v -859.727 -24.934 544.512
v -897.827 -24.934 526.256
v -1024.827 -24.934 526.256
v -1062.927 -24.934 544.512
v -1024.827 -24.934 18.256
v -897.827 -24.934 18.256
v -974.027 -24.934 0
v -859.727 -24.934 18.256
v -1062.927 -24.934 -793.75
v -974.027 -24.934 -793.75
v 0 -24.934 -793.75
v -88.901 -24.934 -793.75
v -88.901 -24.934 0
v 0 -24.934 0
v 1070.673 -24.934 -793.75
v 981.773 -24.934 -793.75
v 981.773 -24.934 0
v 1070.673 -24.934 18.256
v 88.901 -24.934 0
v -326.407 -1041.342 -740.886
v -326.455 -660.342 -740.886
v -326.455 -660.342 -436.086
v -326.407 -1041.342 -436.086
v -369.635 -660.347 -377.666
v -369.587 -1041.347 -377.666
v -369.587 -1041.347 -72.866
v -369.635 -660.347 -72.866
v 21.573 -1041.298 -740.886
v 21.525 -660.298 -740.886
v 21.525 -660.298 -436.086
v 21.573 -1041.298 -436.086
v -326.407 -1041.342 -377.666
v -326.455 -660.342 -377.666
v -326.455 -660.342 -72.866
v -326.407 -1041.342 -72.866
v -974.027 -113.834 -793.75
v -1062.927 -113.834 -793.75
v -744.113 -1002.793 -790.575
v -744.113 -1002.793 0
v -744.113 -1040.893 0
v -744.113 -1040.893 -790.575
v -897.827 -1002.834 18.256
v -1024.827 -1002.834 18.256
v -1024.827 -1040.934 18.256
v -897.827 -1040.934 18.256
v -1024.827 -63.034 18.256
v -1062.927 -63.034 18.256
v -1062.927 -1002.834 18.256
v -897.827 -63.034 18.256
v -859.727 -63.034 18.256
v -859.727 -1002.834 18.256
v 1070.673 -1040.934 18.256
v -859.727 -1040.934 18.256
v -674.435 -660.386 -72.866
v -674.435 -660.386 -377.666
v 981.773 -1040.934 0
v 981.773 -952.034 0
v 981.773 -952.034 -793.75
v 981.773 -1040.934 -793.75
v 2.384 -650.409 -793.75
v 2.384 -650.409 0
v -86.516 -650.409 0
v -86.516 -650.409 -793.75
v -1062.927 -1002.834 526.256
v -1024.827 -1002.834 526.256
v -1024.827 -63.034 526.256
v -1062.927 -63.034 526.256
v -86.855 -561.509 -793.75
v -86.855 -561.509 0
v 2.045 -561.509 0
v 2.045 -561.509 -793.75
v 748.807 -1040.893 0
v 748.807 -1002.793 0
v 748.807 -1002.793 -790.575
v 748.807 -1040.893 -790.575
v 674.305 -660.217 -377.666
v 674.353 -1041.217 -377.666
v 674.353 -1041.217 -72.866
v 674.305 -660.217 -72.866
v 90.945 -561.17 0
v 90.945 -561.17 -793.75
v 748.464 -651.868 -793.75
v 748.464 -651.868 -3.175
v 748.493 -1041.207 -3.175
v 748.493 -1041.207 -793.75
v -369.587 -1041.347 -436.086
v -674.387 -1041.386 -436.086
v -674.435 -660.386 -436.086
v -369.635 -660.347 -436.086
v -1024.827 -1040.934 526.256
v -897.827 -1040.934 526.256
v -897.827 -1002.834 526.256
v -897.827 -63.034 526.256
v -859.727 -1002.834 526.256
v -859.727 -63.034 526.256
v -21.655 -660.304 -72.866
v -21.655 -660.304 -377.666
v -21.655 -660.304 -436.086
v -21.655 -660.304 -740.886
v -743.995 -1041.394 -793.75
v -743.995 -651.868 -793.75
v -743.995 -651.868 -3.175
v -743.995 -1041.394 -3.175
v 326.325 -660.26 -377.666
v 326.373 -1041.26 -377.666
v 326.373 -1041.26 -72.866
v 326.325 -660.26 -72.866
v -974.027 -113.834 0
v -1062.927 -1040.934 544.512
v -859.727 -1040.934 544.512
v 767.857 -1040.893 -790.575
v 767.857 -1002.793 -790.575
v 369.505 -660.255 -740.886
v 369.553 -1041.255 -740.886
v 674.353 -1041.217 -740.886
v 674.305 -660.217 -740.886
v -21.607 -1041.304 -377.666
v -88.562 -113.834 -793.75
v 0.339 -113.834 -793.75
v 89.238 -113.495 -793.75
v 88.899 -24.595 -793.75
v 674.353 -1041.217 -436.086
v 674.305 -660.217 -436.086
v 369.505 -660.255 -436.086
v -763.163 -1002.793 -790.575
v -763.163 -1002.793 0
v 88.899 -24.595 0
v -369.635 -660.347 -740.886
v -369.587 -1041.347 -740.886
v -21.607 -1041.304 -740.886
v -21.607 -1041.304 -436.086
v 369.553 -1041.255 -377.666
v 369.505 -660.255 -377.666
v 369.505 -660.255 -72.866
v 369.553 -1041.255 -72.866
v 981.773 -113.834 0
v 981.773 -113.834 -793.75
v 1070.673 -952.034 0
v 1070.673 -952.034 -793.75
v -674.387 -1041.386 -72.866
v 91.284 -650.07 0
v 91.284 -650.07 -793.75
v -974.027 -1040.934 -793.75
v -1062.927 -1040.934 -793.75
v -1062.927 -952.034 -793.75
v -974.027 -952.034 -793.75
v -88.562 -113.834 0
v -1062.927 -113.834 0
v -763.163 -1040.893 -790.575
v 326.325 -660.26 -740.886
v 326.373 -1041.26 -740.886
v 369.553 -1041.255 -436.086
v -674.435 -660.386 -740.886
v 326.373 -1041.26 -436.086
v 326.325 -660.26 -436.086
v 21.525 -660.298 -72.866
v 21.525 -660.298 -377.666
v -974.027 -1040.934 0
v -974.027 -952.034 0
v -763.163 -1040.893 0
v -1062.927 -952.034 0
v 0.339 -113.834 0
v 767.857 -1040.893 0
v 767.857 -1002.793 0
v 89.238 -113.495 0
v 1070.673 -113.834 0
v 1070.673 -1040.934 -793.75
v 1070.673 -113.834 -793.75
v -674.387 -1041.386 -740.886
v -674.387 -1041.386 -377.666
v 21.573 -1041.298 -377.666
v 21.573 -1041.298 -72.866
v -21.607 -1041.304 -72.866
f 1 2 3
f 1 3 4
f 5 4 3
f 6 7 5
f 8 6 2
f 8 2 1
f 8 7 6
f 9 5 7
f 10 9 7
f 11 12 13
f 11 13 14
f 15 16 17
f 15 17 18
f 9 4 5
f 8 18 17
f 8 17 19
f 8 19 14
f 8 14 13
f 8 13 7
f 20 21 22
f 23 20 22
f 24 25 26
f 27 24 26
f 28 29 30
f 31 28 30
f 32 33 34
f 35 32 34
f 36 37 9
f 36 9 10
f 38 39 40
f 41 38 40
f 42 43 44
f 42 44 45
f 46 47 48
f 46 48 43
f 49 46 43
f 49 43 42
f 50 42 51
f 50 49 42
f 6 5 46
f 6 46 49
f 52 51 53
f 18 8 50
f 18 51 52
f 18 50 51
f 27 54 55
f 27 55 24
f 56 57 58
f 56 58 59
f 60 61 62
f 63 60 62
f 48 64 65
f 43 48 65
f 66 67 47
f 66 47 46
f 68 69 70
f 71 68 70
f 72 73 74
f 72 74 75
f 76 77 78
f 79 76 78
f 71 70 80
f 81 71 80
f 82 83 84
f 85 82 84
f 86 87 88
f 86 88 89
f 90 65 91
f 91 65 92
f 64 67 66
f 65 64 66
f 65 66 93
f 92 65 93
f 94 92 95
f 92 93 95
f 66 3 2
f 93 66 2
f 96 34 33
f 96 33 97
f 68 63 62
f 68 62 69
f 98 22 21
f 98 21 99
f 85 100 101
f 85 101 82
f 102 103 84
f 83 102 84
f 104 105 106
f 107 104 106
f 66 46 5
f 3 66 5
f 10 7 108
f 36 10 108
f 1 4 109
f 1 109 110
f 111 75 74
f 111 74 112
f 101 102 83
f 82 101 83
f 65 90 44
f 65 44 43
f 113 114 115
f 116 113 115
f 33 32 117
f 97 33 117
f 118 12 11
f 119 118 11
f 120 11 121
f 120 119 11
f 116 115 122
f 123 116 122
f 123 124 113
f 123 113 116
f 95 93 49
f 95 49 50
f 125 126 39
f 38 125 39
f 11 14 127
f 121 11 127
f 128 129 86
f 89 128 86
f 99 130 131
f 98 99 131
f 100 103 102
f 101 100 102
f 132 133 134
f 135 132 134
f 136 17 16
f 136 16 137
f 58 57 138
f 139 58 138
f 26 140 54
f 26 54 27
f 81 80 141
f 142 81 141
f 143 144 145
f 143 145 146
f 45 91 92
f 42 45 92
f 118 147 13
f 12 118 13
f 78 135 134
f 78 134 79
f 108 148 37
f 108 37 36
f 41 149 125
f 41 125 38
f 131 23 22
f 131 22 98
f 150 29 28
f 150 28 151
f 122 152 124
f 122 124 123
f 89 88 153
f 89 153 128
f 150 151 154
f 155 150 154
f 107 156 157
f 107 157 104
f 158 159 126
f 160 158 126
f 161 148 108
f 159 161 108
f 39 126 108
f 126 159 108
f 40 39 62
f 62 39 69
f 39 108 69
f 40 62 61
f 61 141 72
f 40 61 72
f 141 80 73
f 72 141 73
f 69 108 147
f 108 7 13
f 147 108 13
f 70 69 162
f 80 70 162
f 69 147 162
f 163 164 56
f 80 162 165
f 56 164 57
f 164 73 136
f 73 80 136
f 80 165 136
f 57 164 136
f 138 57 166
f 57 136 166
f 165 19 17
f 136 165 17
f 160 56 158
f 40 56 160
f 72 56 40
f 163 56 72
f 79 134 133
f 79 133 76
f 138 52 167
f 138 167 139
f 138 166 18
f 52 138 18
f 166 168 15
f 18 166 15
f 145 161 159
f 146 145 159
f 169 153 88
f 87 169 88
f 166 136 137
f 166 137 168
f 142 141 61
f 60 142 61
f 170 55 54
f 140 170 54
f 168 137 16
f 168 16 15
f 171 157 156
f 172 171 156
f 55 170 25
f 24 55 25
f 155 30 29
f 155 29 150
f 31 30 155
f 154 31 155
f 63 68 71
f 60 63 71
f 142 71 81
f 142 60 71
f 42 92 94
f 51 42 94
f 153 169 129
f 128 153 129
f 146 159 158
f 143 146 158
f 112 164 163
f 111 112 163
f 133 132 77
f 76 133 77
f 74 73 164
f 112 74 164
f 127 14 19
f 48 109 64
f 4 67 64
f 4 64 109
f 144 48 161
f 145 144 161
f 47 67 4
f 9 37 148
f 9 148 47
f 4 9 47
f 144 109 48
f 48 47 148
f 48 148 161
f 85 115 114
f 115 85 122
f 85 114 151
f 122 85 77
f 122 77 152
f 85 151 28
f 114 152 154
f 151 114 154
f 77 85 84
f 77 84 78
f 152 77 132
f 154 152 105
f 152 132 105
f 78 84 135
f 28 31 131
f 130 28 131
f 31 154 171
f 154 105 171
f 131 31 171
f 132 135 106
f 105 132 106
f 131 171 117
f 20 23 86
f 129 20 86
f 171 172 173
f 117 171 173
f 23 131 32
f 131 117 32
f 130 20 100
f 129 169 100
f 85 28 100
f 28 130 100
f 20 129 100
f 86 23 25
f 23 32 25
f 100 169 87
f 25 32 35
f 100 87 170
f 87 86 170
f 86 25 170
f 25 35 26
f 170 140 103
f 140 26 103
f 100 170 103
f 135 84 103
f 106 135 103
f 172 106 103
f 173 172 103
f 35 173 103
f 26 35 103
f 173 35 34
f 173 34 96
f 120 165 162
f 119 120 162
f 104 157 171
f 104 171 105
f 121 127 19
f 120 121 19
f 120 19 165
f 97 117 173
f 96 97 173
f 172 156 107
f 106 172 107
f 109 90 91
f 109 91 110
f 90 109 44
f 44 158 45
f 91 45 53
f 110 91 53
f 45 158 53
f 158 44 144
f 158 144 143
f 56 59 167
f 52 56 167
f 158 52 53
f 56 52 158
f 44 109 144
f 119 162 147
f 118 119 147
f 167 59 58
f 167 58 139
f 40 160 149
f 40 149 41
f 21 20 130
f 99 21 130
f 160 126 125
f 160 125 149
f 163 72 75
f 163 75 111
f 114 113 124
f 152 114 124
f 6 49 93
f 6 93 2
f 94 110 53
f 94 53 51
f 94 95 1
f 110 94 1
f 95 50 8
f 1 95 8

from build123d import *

# Parameters (mm, degrees)
F0_W      = 1062.92705037
F0_H      = 1016
F0_W_2    = 1070.67294963
F1_DEPTH  = 18.25625
F2_W      = 88.9
F2_H      = 88.9
F3_DEPTH  = 793.75
F6_DEPTH  = 790.575
F7_W      = 304.8
F7_H      = 304.8
F8_DEPTH  = 381
F9_W      = 19.05
F9_H      = 38.1
F10_DEPTH = 790.575
F11_W     = 38.1
F11_H     = 38.1
F12_DEPTH = 508
F13_W     = 203.2
F13_H     = 1016
F14_DEPTH = 18.25625


with BuildPart() as f1:
    # F0 (on Top) → F1 (new body)
    with BuildSketch(Plane.XY):
        with Locations((-531.463525185, -532.9342050552)):
            Rectangle(F0_W, F0_H)
        with Locations((535.336474815, -532.9342050552)):
            Rectangle(F0_W_2, F0_H)
    extrude(amount=F1_DEPTH)

    # F2 (on face) → F3 (join)
    with BuildSketch(Plane(origin=(0, 0, 0), x_dir=(1, 0, 0), z_dir=(0, 0, -1))):
        with Locations((-1018.47705037, 996.4842050552)):
            Rectangle(F2_W, F2_H)
        with Locations((-1018.47705037, 69.3842050552)):
            Rectangle(F2_W, F2_H)
        with Locations((1026.22294963, 69.3842050552)):
            Rectangle(F2_W, F2_H)
        with Locations((1026.22294963, 996.4842050552)):
            Rectangle(F2_W, F2_H)
        Polygon((2.384284616, 650.4092050552), (-86.5163612858, 650.4092050552), (-86.8552443784, 561.5092050552), (2.0454015234, 561.5092050552), (2.3842821538, 650.4085591582), align=None)
        Polygon((91.2836362568, 650.0696785277), (2.3842821538, 650.4085591582), (2.0454015234, 561.5092050552), (90.9447556263, 561.1703244247), align=None)
        Polygon((0.3388830926, 113.8342050552), (-88.5617628091, 113.8342050552), (-88.9006459018, 24.9342050552), (0, 24.9342050552), (0.3388806305, 113.8335591582), align=None)
        Polygon((89.2382347334, 113.4946785277), (0.3388806305, 113.8335591582), (0, 24.9342050552), (88.8993541029, 24.5953244247), align=None)
    extrude(amount=F3_DEPTH)

    # F9 (on face) → F10 (join)
    with BuildSketch(Plane(origin=(0, 0, 0), x_dir=(1, 0, 0), z_dir=(0, 0, -1))):
        with Locations((758.331836319, 1021.8431928635)):
            Rectangle(F9_W, F9_H)
        with Locations((-753.6382685661, 1021.8431928635)):
            Rectangle(F9_W, F9_H)
    extrude(amount=F10_DEPTH)

    # F11 (on face) → F12 (join)
    with BuildSketch(Plane.XY.offset(18.25625)):
        with Locations((-1043.87705037, -43.9842050552)):
            Rectangle(F11_W, F11_H)
        with Locations((-878.77705037, -43.9842050552)):
            Rectangle(F11_W, F11_H)
        with Locations((-1043.87705037, -1021.8842050552)):
            Rectangle(F11_W, F11_H)
        with Locations((-878.77705037, -1021.8842050552)):
            Rectangle(F11_W, F11_H)
    extrude(amount=F12_DEPTH)

    # F13 (on face) → F14 (join)
    with BuildSketch(Plane.XY.offset(526.25625)):
        with Locations((-961.32705037, -532.9342050552)):
            Rectangle(F13_W, F13_H)
    extrude(amount=F14_DEPTH)


with BuildPart() as f6:
    # F5 (on offset) → F6 (new body)
    with BuildSketch(Plane(origin=(0, 0, -3.175), x_dir=(1, 0, 0), z_dir=(0, 0, -1))):
        Polygon((748.492538929, 1041.2073135376), (-743.9953684807, 1041.3942337036), (-743.9953684807, 651.8683433533), (748.4639286995, 651.8683433533), align=None)
    extrude(amount=F6_DEPTH)

    # F7 (on face) → F8 (cut)
    with BuildSketch(Plane(origin=(0.1304132262, -1041.3010389019, 0), x_dir=(0.9999999922, 0.0001252407, 0), z_dir=(0.0001252407, -0.9999999922, 0))):
        with Locations((-522.117882967, -225.2663967781)):
            Rectangle(F7_W, F7_H)
        with Locations((-522.117882967, -588.4863967781)):
            Rectangle(F7_W, F7_H)
        with Locations((-174.137882967, -225.2663967781)):
            Rectangle(F7_W, F7_H)
        with Locations((-174.137882967, -588.4863967781)):
            Rectangle(F7_W, F7_H)
        with Locations((173.842117033, -225.2663967781)):
            Rectangle(F7_W, F7_H)
        with Locations((173.842117033, -588.4863967781)):
            Rectangle(F7_W, F7_H)
        with Locations((521.822117033, -225.2663967781)):
            Rectangle(F7_W, F7_H)
        with Locations((521.822117033, -588.4863967781)):
            Rectangle(F7_W, F7_H)
    extrude(amount=-F8_DEPTH, mode=Mode.SUBTRACT)


solid = Compound([f1.part, f6.part])
